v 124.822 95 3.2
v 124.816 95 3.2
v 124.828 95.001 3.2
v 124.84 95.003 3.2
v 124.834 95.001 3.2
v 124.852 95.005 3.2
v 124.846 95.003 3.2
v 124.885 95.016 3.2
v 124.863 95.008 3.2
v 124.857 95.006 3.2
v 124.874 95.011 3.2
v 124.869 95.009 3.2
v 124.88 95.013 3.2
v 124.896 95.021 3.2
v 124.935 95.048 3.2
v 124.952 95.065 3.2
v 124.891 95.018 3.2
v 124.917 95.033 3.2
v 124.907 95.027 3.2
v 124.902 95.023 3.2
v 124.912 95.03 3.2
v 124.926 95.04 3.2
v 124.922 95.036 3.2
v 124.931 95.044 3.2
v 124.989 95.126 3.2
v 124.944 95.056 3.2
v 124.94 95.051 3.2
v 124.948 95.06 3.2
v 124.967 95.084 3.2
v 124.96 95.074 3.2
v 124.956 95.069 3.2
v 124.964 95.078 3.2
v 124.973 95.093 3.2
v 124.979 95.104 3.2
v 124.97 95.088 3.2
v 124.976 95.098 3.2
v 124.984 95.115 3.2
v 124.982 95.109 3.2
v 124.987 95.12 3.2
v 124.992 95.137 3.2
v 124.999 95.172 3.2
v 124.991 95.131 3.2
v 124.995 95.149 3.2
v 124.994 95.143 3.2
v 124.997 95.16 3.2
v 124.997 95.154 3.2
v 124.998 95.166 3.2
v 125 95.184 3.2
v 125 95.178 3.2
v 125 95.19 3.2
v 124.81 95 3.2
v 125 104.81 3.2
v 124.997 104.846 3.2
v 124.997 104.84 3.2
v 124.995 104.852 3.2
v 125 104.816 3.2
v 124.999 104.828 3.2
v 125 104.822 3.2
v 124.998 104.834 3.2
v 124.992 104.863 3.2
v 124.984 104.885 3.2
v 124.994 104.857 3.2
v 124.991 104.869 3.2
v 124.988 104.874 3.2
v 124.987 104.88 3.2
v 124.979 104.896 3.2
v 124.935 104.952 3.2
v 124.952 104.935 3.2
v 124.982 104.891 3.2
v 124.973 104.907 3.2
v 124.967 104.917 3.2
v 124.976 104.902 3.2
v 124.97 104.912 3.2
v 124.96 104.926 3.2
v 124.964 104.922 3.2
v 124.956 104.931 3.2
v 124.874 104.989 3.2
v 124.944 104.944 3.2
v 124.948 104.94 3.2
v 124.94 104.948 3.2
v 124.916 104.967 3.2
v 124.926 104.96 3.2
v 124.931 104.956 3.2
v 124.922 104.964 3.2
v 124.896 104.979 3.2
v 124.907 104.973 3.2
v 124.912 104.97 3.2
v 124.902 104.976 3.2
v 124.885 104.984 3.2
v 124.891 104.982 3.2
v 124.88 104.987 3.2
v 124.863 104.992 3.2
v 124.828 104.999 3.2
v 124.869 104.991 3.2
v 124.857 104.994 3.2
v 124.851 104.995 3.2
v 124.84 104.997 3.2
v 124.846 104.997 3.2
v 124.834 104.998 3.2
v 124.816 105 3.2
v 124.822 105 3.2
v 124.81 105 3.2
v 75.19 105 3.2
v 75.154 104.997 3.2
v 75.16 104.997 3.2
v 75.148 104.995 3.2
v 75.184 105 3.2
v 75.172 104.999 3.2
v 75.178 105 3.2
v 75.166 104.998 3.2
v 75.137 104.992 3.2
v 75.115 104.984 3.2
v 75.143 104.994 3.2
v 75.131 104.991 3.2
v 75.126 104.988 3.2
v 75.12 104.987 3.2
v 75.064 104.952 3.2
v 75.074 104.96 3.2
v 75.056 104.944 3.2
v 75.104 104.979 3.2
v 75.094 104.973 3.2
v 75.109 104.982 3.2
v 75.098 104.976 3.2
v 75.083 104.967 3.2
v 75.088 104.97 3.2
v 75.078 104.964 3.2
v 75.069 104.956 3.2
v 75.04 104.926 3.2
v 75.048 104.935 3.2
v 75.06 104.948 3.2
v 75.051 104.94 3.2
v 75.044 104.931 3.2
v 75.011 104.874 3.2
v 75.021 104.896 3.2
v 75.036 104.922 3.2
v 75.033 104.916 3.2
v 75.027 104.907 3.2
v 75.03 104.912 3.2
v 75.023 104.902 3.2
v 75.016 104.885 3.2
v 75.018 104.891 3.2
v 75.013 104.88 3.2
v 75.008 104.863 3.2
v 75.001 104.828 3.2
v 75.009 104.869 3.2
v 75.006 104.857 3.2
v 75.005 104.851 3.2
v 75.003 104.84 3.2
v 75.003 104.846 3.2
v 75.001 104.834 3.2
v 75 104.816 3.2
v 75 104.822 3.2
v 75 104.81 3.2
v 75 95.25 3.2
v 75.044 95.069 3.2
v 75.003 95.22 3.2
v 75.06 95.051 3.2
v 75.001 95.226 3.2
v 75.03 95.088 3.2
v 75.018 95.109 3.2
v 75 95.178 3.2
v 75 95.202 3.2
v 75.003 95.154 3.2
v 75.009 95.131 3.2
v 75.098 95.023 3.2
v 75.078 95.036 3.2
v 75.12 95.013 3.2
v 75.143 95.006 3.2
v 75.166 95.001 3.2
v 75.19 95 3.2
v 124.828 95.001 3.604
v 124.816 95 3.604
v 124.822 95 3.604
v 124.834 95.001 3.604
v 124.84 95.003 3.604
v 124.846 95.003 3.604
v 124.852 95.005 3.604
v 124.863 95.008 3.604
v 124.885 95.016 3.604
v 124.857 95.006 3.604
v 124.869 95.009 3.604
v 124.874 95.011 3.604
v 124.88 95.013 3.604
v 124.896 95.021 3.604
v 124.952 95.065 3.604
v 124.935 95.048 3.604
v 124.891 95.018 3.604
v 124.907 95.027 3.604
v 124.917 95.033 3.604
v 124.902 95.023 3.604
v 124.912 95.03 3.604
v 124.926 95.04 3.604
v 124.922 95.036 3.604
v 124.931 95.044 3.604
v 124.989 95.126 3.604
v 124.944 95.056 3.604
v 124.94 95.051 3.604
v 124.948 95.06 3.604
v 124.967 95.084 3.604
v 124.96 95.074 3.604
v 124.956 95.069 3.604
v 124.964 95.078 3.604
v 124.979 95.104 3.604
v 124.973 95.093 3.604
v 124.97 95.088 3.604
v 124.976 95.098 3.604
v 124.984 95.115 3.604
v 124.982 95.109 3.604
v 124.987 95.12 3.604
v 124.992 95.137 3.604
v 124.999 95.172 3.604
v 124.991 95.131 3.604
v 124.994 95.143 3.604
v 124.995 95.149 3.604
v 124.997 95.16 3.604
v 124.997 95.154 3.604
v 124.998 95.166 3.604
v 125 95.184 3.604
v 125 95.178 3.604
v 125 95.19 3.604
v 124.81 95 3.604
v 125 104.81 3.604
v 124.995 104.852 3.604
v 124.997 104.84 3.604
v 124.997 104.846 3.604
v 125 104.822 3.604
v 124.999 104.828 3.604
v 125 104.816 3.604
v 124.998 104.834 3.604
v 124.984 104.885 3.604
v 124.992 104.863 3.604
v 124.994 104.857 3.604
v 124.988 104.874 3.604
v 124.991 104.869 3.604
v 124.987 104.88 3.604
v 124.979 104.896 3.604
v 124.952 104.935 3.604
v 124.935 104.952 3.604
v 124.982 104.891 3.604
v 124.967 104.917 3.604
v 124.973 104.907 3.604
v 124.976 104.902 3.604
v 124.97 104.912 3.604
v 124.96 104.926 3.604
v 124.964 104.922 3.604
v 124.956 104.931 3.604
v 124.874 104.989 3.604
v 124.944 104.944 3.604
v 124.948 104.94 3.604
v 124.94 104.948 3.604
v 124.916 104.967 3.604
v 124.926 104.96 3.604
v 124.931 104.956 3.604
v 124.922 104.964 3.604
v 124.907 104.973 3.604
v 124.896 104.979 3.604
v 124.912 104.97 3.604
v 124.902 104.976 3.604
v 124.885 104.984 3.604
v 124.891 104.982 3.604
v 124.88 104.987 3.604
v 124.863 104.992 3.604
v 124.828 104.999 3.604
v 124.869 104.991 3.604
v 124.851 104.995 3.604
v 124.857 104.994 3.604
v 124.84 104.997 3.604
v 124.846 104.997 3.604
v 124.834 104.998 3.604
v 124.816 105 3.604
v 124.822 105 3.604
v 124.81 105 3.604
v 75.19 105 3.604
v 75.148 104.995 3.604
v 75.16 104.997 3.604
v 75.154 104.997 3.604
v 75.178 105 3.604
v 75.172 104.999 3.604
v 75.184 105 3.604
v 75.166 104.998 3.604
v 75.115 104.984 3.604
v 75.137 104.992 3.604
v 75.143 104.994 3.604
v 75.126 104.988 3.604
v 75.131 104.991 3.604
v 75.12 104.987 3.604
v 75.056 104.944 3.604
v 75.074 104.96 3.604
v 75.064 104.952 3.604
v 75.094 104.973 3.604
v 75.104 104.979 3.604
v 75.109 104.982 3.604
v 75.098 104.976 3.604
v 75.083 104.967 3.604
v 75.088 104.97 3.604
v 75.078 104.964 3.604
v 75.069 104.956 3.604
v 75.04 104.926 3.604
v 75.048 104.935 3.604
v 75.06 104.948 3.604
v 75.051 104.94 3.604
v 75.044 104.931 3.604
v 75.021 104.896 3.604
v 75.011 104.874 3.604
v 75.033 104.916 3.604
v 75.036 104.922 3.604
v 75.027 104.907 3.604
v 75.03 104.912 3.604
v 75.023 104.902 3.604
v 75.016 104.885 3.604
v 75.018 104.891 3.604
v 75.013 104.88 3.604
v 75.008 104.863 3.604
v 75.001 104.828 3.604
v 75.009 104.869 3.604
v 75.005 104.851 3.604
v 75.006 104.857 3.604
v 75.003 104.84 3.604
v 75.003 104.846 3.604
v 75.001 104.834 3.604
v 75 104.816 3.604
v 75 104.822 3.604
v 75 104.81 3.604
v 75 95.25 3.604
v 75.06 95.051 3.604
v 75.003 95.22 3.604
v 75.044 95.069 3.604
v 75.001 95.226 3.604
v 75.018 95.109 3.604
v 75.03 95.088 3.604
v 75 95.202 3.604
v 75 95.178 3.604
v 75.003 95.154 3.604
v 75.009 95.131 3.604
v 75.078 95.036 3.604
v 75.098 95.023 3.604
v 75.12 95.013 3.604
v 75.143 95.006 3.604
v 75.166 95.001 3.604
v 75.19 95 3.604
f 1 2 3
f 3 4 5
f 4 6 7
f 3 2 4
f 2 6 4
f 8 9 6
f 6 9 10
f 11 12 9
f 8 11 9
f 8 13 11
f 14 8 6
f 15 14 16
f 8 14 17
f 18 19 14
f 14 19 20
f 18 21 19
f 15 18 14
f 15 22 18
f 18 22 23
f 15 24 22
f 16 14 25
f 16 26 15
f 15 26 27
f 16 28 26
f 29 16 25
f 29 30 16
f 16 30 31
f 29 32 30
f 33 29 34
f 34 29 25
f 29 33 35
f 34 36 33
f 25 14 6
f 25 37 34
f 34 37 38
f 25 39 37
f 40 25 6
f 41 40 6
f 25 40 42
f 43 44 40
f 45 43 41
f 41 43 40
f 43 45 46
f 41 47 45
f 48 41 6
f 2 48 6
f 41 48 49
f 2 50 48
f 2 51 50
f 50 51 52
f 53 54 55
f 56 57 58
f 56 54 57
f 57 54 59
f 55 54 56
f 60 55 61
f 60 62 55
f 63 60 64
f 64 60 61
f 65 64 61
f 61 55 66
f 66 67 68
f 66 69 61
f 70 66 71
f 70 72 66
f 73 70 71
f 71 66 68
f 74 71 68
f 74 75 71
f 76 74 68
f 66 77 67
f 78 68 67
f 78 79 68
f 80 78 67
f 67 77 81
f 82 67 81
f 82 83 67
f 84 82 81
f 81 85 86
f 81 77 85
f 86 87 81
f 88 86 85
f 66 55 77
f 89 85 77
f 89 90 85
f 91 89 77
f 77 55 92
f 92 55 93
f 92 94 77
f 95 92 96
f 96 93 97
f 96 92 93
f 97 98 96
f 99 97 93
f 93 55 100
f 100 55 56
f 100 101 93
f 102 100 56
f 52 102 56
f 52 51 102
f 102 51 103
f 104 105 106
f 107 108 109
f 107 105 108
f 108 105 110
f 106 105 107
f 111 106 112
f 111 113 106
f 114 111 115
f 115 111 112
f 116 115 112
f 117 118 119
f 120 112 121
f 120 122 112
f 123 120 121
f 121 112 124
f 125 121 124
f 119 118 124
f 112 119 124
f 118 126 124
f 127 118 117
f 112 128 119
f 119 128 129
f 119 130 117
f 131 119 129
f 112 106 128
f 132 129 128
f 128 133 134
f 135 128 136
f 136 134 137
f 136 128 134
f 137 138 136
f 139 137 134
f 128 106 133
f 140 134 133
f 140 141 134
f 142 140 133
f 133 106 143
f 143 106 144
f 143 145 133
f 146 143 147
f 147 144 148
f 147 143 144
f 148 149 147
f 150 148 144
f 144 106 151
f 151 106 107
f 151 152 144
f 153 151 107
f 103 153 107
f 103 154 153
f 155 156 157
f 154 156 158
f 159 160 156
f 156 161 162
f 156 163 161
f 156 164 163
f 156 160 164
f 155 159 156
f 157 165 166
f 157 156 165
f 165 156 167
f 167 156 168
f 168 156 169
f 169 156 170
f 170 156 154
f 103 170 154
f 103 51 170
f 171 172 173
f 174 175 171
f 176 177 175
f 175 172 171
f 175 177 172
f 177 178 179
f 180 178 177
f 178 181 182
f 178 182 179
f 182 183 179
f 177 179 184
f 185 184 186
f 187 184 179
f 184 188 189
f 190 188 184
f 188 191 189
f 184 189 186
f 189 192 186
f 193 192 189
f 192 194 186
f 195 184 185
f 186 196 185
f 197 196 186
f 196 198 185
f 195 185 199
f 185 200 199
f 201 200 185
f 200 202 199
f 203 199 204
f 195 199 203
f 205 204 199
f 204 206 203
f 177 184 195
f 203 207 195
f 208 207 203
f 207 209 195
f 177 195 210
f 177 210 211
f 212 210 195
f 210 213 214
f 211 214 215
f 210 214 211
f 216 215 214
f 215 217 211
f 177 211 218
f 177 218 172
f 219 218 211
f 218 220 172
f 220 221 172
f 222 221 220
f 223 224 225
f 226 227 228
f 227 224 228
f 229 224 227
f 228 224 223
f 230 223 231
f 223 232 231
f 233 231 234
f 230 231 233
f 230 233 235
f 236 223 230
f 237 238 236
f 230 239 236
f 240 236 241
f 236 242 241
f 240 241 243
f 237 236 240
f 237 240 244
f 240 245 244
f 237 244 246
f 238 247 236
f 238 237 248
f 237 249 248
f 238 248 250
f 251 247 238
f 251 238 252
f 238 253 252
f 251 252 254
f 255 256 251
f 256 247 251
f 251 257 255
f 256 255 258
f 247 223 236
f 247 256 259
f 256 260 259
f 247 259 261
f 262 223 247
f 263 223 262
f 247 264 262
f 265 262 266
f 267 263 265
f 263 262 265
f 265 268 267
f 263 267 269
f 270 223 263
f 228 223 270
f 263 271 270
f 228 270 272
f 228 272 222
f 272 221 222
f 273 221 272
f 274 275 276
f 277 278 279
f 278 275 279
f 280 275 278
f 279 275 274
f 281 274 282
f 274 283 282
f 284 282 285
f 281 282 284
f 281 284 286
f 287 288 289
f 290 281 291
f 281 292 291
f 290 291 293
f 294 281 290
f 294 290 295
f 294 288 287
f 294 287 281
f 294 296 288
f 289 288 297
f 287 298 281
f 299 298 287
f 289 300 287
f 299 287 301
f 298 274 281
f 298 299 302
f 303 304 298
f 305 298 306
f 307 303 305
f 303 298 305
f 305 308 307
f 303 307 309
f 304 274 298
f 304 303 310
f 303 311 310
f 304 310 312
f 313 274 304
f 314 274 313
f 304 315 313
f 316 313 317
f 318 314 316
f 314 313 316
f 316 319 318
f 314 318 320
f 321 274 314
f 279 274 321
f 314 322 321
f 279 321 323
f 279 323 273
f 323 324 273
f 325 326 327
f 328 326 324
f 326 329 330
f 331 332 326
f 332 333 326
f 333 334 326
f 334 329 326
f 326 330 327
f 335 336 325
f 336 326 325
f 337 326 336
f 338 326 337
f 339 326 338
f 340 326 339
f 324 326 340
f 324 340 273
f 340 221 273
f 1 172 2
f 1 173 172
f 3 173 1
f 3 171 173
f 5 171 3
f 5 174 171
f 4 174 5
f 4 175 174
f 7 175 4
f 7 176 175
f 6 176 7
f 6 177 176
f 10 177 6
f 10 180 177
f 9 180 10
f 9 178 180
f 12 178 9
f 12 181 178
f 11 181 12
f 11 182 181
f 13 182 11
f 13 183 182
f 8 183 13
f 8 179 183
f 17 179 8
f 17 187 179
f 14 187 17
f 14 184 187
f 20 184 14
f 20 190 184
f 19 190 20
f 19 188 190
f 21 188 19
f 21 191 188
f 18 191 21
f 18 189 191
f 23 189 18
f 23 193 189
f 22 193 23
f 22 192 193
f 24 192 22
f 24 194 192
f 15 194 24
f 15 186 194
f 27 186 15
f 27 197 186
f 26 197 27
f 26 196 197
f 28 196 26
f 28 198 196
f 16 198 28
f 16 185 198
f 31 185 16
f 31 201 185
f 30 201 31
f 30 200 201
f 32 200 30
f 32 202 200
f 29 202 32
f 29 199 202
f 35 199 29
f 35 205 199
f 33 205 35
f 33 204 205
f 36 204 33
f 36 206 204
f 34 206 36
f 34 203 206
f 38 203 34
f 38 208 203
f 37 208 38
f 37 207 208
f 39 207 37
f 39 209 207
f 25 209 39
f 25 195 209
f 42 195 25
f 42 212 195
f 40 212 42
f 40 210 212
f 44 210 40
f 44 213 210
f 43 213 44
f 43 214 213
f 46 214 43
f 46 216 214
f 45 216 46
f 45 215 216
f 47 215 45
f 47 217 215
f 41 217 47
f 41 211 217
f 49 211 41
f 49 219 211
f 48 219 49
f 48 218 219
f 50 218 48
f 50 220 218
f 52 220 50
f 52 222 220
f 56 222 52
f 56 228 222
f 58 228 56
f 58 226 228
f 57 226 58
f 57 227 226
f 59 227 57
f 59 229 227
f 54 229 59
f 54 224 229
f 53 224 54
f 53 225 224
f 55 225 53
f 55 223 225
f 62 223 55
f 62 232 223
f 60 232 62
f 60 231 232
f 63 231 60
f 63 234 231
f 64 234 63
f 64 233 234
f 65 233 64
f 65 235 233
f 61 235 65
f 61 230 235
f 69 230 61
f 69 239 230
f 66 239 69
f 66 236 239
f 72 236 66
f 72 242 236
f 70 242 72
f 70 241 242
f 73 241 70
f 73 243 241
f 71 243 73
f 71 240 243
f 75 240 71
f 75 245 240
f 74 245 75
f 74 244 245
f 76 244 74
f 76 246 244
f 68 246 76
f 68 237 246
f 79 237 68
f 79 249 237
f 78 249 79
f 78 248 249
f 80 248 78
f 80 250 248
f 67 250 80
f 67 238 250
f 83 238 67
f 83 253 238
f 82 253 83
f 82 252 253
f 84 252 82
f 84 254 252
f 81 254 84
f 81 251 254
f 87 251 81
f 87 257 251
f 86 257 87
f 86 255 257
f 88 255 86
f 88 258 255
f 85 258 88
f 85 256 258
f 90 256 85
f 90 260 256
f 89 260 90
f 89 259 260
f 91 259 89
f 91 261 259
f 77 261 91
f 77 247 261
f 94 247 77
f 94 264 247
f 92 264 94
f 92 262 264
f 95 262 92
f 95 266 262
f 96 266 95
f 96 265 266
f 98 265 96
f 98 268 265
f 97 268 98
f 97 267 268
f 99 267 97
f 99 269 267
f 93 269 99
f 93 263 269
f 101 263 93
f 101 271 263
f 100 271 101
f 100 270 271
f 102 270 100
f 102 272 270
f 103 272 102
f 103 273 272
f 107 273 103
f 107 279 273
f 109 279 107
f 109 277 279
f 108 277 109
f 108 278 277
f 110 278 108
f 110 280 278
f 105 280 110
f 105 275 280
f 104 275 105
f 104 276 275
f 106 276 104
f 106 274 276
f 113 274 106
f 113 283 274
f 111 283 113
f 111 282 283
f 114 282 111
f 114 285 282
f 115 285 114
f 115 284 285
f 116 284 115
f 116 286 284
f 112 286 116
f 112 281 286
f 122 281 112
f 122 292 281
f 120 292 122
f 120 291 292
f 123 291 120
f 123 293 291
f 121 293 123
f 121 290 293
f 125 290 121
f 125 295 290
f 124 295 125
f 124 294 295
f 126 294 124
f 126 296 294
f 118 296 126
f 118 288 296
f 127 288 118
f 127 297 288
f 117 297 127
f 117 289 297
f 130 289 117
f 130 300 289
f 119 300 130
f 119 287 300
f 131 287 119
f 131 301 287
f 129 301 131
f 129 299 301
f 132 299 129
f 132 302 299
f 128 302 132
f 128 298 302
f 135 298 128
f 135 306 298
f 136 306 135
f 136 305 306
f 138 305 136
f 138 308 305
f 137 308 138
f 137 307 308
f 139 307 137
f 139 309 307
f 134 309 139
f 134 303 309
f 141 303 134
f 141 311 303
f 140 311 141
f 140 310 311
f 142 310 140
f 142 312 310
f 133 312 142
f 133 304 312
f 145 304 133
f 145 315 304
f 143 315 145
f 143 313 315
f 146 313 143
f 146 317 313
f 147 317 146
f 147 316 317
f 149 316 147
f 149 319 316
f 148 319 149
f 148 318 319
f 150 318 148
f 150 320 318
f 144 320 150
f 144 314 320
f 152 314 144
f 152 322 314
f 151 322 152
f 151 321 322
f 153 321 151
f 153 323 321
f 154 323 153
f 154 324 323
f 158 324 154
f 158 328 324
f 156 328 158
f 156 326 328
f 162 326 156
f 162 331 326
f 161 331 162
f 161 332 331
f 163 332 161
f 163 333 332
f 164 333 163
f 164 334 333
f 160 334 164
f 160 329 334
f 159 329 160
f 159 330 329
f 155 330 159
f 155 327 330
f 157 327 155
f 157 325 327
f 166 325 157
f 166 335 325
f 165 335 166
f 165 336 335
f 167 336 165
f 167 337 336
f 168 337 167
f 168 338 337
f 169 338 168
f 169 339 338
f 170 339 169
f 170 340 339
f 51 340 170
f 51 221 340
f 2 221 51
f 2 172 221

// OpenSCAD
module drawBasicShape(x1, y1, x2, y2, width)
{
	length = sqrt((x1-x2)*(x1-x2) + (y1-y2)*(y1-y2));
	if (width!=0.0) {
		square(size = [width, length], center = false);
		translate([width/2.0, 0, 0]) circle(d=width);
		translate([width/2.0, length, 0]) circle(d=width);
	}
}

module translateAndRotate(x1, y1, x2, y2, width)
{
	if (width != 0.0) {
		angle = atan((y2-y1)/(x2-x1)) +270;
		if (x2>=x1) {
			translate([x1, y1, 0.0]) rotate([0.0, 0.0, angle]) translate([-width/2.0, 0.0, 0.0]) scale([1.0, 1.0, 1.0]) drawBasicShape(x1, y1, x2, y2, width);
		}
		else {
			translate([x1, y1, 0.0]) rotate([0.0, 0.0, angle+180]) translate([-width/2.0, 0.0, 0.0]) scale([1.0, 1.0, 1.0]) drawBasicShape(x1, y1, x2, y2, width);		}
	}
}

$fn=50;

points7 = [
[75.77800000, 95.77800000, 0.00000000],
[124.22200000, 95.77800000, 0.37999548],
[124.22200000, 104.22200000, 0.37997788],
[75.77800000, 104.22200000, 0.37999672],
[75.77800000, 95.83800000, 0.37997423],
[75.48400000, 95.48400000, 0.00000000],
[124.51600000, 95.48400000, 0.37999868],
[124.51600000, 104.51600000, 0.37998977],
[75.48400000, 104.51600000, 0.37999746],
[75.48400000, 95.54400000, 0.37998644],
[75.19000000, 95.19000000, 0.00000000],
[124.81000000, 95.19000000, 0.38000060],
[124.81000000, 104.81000000, 0.38000021],
[75.19000000, 104.81000000, 0.37999939],
[75.19000000, 95.25000000, 0.38000344],
[75.53600000, 95.39000000, 0.00000000],
[76.11100000, 95.94600000, 0.00000000],
[75.94600000, 96.11100000, 0.37961375],
[75.94600000, 96.52800000, 0.38001190],
[76.52800000, 95.94600000, 0.37989934],
[76.94500000, 95.94600000, 0.38001190],
[75.94600000, 96.94500000, 0.37998907],
[75.94600000, 97.36200000, 0.38001190],
[77.36200000, 95.94600000, 0.37999592],
[77.77900000, 95.94600000, 0.38001190],
[75.94600000, 97.77900000, 0.37999966],
[75.94600000, 98.19600000, 0.38001190],
[78.19600000, 95.94600000, 0.38002091],
[78.61300000, 95.94600000, 0.38001190],
[75.94600000, 98.61300000, 0.38001957],
[75.94600000, 99.03000000, 0.38001190],
[79.03000000, 95.94600000, 0.38001859],
[79.44700000, 95.94600000, 0.38001190],
[75.94600000, 99.44700000, 0.38001785],
[75.94600000, 99.86400000, 0.38015610],
[79.86400000, 95.94600000, 0.38001726],
[80.28100000, 95.94600000, 0.38015610],
[75.94600000, 100.28100000, 0.38002660],
[75.94600000, 100.69800000, 0.38001190],
[80.69800000, 95.94600000, 0.38002534],
[81.11500000, 95.94600000, 0.38015610],
[75.94600000, 101.11500000, 0.38002430],
[75.94600000, 101.53300000, 0.37930814],
[81.53300000, 95.94600000, 0.37997836],
[81.95000000, 95.94600000, 0.38015610],
[75.94600000, 101.95000000, 0.37998072],
[75.94600000, 102.36700000, 0.38001190],
[82.36700000, 95.94600000, 0.37998939],
[82.78400000, 95.94600000, 0.38001190],
[75.94600000, 102.78400000, 0.37999079],
[75.94600000, 103.20100000, 0.38001190],
[83.20100000, 95.94600000, 0.37999789],
[83.61800000, 95.94600000, 0.38001190],
[75.94600000, 103.61800000, 0.37999868],
[75.95600000, 104.02400000, 0.38033920],
[84.03500000, 95.94600000, 0.38000275],
[84.45200000, 95.94600000, 0.38015610],
[76.34400000, 104.05400000, 0.38000229],
[76.76100000, 104.05400000, 0.38001190],
[84.86900000, 95.94600000, 0.38000229],
[85.28600000, 95.94600000, 0.38015610],
[77.17800000, 104.05400000, 0.38000229],
[77.59500000, 104.05400000, 0.38001190],
[85.70300000, 95.94600000, 0.38000754],
[86.12000000, 95.94600000, 0.38001190],
[78.01200000, 104.05400000, 0.38000229],
[78.42900000, 104.05400000, 0.38015610],
[86.53700000, 95.94600000, 0.38000229],
[86.95400000, 95.94600000, 0.38001190],
[78.84600000, 104.05400000, 0.38000229],
[79.26300000, 104.05400000, 0.38015610],
[87.37100000, 95.94600000, 0.38000229],
[87.78900000, 95.94600000, 0.37930814],
[79.68000000, 104.05400000, 0.37998940],
[80.09700000, 104.05400000, 0.38001190],
[88.20600000, 95.94600000, 0.37998415],
[88.62300000, 95.94600000, 0.38001190],
[80.51500000, 104.05400000, 0.38000754],
[80.93200000, 104.05400000, 0.38001190],
[89.04000000, 95.94600000, 0.38000229],
[89.45700000, 95.94600000, 0.38015610],
[81.34900000, 104.05400000, 0.38000229],
[81.76600000, 104.05400000, 0.38001190],
[89.87400000, 95.94600000, 0.38000754],
[90.29100000, 95.94600000, 0.38001190],
[82.18300000, 104.05400000, 0.38000229],
[82.60000000, 104.05400000, 0.38001190],
[90.70800000, 95.94600000, 0.38000754],
[91.12500000, 95.94600000, 0.38001190],
[83.01700000, 104.05400000, 0.38000229],
[83.43400000, 104.05400000, 0.38015610],
[91.54200000, 95.94600000, 0.38000229],
[91.95900000, 95.94600000, 0.38001190],
[83.85100000, 104.05400000, 0.38000754],
[84.26800000, 104.05400000, 0.38001190],
[92.37600000, 95.94600000, 0.38000229],
[92.79300000, 95.94600000, 0.38001190],
[84.68500000, 104.05400000, 0.38000754],
[85.10200000, 104.05400000, 0.38001190],
[93.21000000, 95.94600000, 0.38000229],
[93.62700000, 95.94600000, 0.38015610],
[85.51900000, 104.05400000, 0.38000229],
[85.93600000, 104.05400000, 0.38001190],
[94.04400000, 95.94600000, 0.38000754],
[94.46200000, 95.94600000, 0.37930814],
[86.35300000, 104.05400000, 0.37998415],
[86.77000000, 104.05400000, 0.38001190],
[94.87900000, 95.94600000, 0.37998940],
[95.29600000, 95.94600000, 0.38001190],
[87.18800000, 104.05400000, 0.38000229],
[87.60500000, 104.05400000, 0.38015610],
[95.71300000, 95.94600000, 0.38000229],
[96.13000000, 95.94600000, 0.38001190],
[88.02200000, 104.05400000, 0.38000754],
[88.43900000, 104.05400000, 0.38001190],
[96.54700000, 95.94600000, 0.38000229],
[96.96400000, 95.94600000, 0.38001190],
[88.85600000, 104.05400000, 0.38000754],
[89.27300000, 104.05400000, 0.38001190],
[97.38100000, 95.94600000, 0.38000229],
[97.79800000, 95.94600000, 0.38015610],
[89.69000000, 104.05400000, 0.38000229],
[90.10700000, 104.05400000, 0.38001190],
[98.21500000, 95.94600000, 0.38000229],
[98.63200000, 95.94600000, 0.38015610],
[90.52400000, 104.05400000, 0.38000229],
[90.94100000, 104.05400000, 0.38001190],
[99.04900000, 95.94600000, 0.38000754],
[99.46600000, 95.94600000, 0.38001190],
[91.35800000, 104.05400000, 0.38000229],
[91.77500000, 104.05400000, 0.38015610],
[99.88300000, 95.94600000, 0.38000229],
[100.30000000, 95.94600000, 0.38001190],
[92.19200000, 104.05400000, 0.38000229],
[92.60900000, 104.05400000, 0.38015610],
[100.71800000, 95.94600000, 0.37998415],
[101.13500000, 95.94600000, 0.38001190],
[93.02600000, 104.05400000, 0.37998940],
[93.44400000, 104.05400000, 0.37930814],
[101.55200000, 95.94600000, 0.38000229],
[101.96900000, 95.94600000, 0.38015610],
[93.86100000, 104.05400000, 0.38000229],
[94.27800000, 104.05400000, 0.38001190],
[102.38600000, 95.94600000, 0.38000754],
[102.80300000, 95.94600000, 0.38001190],
[94.69500000, 104.05400000, 0.38000229],
[95.11200000, 104.05400000, 0.38001190],
[103.22000000, 95.94600000, 0.38000754],
[103.63700000, 95.94600000, 0.38001190],
[95.52900000, 104.05400000, 0.38000229],
[95.94600000, 104.05400000, 0.38015610],
[104.05400000, 95.94600000, 0.38000229],
[104.47100000, 95.94600000, 0.38001190],
[96.36300000, 104.05400000, 0.38000754],
[96.78000000, 104.05400000, 0.38001190],
[104.88800000, 95.94600000, 0.38000229],
[105.30500000, 95.94600000, 0.38001190],
[97.19700000, 104.05400000, 0.38000754],
[97.61400000, 104.05400000, 0.38001190],
[105.72200000, 95.94600000, 0.38000229],
[106.13900000, 95.94600000, 0.38015610],
[98.03100000, 104.05400000, 0.38000229],
[98.44800000, 104.05400000, 0.38001190],
[106.55600000, 95.94600000, 0.38000754],
[106.97300000, 95.94600000, 0.38001190],
[98.86500000, 104.05400000, 0.38000229],
[99.28200000, 104.05400000, 0.38001190],
[107.39100000, 95.94600000, 0.37998940],
[107.80800000, 95.94600000, 0.38001190],
[99.69900000, 104.05400000, 0.37998415],
[100.11700000, 104.05400000, 0.37945200],
[108.22500000, 95.94600000, 0.38000229],
[108.64200000, 95.94600000, 0.38001190],
[100.53400000, 104.05400000, 0.38000754],
[100.95100000, 104.05400000, 0.38001190],
[109.05900000, 95.94600000, 0.38000229],
[109.47600000, 95.94600000, 0.38001190],
[101.36800000, 104.05400000, 0.38000754],
[101.78500000, 104.05400000, 0.38001190],
[109.89300000, 95.94600000, 0.38000229],
[110.31000000, 95.94600000, 0.38015610],
[102.20200000, 104.05400000, 0.38000229],
[102.61900000, 104.05400000, 0.38001190],
[110.72700000, 95.94600000, 0.38000754],
[111.14400000, 95.94600000, 0.38001190],
[103.03600000, 104.05400000, 0.38000229],
[103.45300000, 104.05400000, 0.38001190],
[111.56100000, 95.94600000, 0.38000754],
[111.97800000, 95.94600000, 0.38001190],
[103.87000000, 104.05400000, 0.38000229],
[104.28700000, 104.05400000, 0.38015610],
[112.39500000, 95.94600000, 0.38000229],
[112.81200000, 95.94600000, 0.38001190],
[104.70400000, 104.05400000, 0.38000229],
[105.12100000, 104.05400000, 0.38015610],
[113.22900000, 95.94600000, 0.38000229],
[113.64700000, 95.94600000, 0.37930814],
[105.53800000, 104.05400000, 0.37998940],
[105.95500000, 104.05400000, 0.38001190],
[114.06400000, 95.94600000, 0.37998415],
[114.48100000, 95.94600000, 0.38015610],
[106.37300000, 104.05400000, 0.38000229],
[106.79000000, 104.05400000, 0.38001190],
[114.89800000, 95.94600000, 0.38000229],
[115.31500000, 95.94600000, 0.38015610],
[107.20700000, 104.05400000, 0.38000229],
[107.62400000, 104.05400000, 0.38001190],
[115.73200000, 95.94600000, 0.38000754],
[116.14900000, 95.94600000, 0.38001190],
[108.04100000, 104.05400000, 0.38000229],
[108.45800000, 104.05400000, 0.38015610],
[116.56600000, 95.94600000, 0.38000229],
[116.98300000, 95.94600000, 0.38001190],
[108.87500000, 104.05400000, 0.38000229],
[109.29200000, 104.05400000, 0.38015610],
[117.40000000, 95.94600000, 0.38000229],
[117.81700000, 95.94600000, 0.38001190],
[109.70900000, 104.05400000, 0.38000754],
[110.12600000, 104.05400000, 0.38001190],
[118.23400000, 95.94600000, 0.38000229],
[118.65100000, 95.94600000, 0.38015610],
[110.54300000, 104.05400000, 0.38000229],
[110.96000000, 104.05400000, 0.38001190],
[119.06800000, 95.94600000, 0.38000229],
[119.48500000, 95.94600000, 0.38015610],
[111.37700000, 104.05400000, 0.38000229],
[111.79400000, 104.05400000, 0.38001190],
[119.90200000, 95.94600000, 0.38000754],
[120.32000000, 95.94600000, 0.37930814],
[112.21100000, 104.05400000, 0.37998415],
[112.62900000, 104.05400000, 0.37930814],
[120.73700000, 95.94600000, 0.38000754],
[121.15400000, 95.94600000, 0.38001190],
[113.04600000, 104.05400000, 0.38000229],
[113.46300000, 104.05400000, 0.38015610],
[121.57100000, 95.94600000, 0.38000229],
[121.98800000, 95.94600000, 0.38001190],
[113.88000000, 104.05400000, 0.38000754],
[114.29700000, 104.05400000, 0.38001190],
[122.40500000, 95.94600000, 0.38000229],
[122.82200000, 95.94600000, 0.38001190],
[114.71400000, 104.05400000, 0.38000754],
[115.13100000, 104.05400000, 0.38001190],
[123.23900000, 95.94600000, 0.38000229],
[123.65600000, 95.94600000, 0.38015610],
[115.54800000, 104.05400000, 0.38000229],
[115.96500000, 104.05400000, 0.38001190],
[124.04400000, 95.97500000, 0.37998455],
[124.05400000, 96.38200000, 0.37976376],
[116.38200000, 104.05400000, 0.37999868],
[116.79900000, 104.05400000, 0.38001190],
[124.05400000, 96.79900000, 0.37999789],
[124.05400000, 97.21600000, 0.38001190],
[117.21600000, 104.05400000, 0.37999701],
[117.63300000, 104.05400000, 0.38001190],
[124.05400000, 97.63300000, 0.37998939],
[124.05400000, 98.05000000, 0.38001190],
[118.05000000, 104.05400000, 0.37998780],
[118.46700000, 104.05400000, 0.38001190],
[124.05400000, 98.46700000, 0.37997836],
[124.05400000, 98.88400000, 0.38015610],
[118.88400000, 104.05400000, 0.37997562],
[119.30200000, 104.05400000, 0.37930814],
[124.05400000, 99.30200000, 0.38003429],
[124.05400000, 99.71900000, 0.38001190],
[119.71900000, 104.05400000, 0.38002660],
[120.13600000, 104.05400000, 0.38001190],
[124.05400000, 100.13600000, 0.38002811],
[124.05400000, 100.55300000, 0.38015610],
[120.55300000, 104.05400000, 0.38001785],
[120.97000000, 104.05400000, 0.38015610],
[124.05400000, 100.97000000, 0.38001859],
[124.05400000, 101.38700000, 0.38001190],
[121.38700000, 104.05400000, 0.38001957],
[121.80400000, 104.05400000, 0.38015610],
[124.05400000, 101.80400000, 0.38000201],
[124.05400000, 102.22100000, 0.38015610],
[122.22100000, 104.05400000, 0.37999966],
[122.63800000, 104.05400000, 0.38001190],
[124.05400000, 102.63800000, 0.37999592],
[124.05400000, 103.05500000, 0.38015610],
[123.05500000, 104.05400000, 0.37994651],
[123.47200000, 104.05400000, 0.38015610],
[124.05400000, 103.47200000, 0.37989934],
[124.05400000, 103.88900000, 0.38001190],
[123.88900000, 104.05400000, 0.37987144],
];

translate([0.0, 0.0, 3.20000000]) {
	linear_extrude(height = 0.40400000, center = false, convexity = 10, twist = 0) {
		union() {
			for( i=[0:len(points7)-2] ){ 
				x1 = points7[i][0];
				y1 = points7[i][1];
				x2 = points7[i+1][0];
				y2 = points7[i+1][1];
				width = points7[i+1][2];
				translateAndRotate(x1, y1, x2, y2, width);
			}
		}
	}
}
